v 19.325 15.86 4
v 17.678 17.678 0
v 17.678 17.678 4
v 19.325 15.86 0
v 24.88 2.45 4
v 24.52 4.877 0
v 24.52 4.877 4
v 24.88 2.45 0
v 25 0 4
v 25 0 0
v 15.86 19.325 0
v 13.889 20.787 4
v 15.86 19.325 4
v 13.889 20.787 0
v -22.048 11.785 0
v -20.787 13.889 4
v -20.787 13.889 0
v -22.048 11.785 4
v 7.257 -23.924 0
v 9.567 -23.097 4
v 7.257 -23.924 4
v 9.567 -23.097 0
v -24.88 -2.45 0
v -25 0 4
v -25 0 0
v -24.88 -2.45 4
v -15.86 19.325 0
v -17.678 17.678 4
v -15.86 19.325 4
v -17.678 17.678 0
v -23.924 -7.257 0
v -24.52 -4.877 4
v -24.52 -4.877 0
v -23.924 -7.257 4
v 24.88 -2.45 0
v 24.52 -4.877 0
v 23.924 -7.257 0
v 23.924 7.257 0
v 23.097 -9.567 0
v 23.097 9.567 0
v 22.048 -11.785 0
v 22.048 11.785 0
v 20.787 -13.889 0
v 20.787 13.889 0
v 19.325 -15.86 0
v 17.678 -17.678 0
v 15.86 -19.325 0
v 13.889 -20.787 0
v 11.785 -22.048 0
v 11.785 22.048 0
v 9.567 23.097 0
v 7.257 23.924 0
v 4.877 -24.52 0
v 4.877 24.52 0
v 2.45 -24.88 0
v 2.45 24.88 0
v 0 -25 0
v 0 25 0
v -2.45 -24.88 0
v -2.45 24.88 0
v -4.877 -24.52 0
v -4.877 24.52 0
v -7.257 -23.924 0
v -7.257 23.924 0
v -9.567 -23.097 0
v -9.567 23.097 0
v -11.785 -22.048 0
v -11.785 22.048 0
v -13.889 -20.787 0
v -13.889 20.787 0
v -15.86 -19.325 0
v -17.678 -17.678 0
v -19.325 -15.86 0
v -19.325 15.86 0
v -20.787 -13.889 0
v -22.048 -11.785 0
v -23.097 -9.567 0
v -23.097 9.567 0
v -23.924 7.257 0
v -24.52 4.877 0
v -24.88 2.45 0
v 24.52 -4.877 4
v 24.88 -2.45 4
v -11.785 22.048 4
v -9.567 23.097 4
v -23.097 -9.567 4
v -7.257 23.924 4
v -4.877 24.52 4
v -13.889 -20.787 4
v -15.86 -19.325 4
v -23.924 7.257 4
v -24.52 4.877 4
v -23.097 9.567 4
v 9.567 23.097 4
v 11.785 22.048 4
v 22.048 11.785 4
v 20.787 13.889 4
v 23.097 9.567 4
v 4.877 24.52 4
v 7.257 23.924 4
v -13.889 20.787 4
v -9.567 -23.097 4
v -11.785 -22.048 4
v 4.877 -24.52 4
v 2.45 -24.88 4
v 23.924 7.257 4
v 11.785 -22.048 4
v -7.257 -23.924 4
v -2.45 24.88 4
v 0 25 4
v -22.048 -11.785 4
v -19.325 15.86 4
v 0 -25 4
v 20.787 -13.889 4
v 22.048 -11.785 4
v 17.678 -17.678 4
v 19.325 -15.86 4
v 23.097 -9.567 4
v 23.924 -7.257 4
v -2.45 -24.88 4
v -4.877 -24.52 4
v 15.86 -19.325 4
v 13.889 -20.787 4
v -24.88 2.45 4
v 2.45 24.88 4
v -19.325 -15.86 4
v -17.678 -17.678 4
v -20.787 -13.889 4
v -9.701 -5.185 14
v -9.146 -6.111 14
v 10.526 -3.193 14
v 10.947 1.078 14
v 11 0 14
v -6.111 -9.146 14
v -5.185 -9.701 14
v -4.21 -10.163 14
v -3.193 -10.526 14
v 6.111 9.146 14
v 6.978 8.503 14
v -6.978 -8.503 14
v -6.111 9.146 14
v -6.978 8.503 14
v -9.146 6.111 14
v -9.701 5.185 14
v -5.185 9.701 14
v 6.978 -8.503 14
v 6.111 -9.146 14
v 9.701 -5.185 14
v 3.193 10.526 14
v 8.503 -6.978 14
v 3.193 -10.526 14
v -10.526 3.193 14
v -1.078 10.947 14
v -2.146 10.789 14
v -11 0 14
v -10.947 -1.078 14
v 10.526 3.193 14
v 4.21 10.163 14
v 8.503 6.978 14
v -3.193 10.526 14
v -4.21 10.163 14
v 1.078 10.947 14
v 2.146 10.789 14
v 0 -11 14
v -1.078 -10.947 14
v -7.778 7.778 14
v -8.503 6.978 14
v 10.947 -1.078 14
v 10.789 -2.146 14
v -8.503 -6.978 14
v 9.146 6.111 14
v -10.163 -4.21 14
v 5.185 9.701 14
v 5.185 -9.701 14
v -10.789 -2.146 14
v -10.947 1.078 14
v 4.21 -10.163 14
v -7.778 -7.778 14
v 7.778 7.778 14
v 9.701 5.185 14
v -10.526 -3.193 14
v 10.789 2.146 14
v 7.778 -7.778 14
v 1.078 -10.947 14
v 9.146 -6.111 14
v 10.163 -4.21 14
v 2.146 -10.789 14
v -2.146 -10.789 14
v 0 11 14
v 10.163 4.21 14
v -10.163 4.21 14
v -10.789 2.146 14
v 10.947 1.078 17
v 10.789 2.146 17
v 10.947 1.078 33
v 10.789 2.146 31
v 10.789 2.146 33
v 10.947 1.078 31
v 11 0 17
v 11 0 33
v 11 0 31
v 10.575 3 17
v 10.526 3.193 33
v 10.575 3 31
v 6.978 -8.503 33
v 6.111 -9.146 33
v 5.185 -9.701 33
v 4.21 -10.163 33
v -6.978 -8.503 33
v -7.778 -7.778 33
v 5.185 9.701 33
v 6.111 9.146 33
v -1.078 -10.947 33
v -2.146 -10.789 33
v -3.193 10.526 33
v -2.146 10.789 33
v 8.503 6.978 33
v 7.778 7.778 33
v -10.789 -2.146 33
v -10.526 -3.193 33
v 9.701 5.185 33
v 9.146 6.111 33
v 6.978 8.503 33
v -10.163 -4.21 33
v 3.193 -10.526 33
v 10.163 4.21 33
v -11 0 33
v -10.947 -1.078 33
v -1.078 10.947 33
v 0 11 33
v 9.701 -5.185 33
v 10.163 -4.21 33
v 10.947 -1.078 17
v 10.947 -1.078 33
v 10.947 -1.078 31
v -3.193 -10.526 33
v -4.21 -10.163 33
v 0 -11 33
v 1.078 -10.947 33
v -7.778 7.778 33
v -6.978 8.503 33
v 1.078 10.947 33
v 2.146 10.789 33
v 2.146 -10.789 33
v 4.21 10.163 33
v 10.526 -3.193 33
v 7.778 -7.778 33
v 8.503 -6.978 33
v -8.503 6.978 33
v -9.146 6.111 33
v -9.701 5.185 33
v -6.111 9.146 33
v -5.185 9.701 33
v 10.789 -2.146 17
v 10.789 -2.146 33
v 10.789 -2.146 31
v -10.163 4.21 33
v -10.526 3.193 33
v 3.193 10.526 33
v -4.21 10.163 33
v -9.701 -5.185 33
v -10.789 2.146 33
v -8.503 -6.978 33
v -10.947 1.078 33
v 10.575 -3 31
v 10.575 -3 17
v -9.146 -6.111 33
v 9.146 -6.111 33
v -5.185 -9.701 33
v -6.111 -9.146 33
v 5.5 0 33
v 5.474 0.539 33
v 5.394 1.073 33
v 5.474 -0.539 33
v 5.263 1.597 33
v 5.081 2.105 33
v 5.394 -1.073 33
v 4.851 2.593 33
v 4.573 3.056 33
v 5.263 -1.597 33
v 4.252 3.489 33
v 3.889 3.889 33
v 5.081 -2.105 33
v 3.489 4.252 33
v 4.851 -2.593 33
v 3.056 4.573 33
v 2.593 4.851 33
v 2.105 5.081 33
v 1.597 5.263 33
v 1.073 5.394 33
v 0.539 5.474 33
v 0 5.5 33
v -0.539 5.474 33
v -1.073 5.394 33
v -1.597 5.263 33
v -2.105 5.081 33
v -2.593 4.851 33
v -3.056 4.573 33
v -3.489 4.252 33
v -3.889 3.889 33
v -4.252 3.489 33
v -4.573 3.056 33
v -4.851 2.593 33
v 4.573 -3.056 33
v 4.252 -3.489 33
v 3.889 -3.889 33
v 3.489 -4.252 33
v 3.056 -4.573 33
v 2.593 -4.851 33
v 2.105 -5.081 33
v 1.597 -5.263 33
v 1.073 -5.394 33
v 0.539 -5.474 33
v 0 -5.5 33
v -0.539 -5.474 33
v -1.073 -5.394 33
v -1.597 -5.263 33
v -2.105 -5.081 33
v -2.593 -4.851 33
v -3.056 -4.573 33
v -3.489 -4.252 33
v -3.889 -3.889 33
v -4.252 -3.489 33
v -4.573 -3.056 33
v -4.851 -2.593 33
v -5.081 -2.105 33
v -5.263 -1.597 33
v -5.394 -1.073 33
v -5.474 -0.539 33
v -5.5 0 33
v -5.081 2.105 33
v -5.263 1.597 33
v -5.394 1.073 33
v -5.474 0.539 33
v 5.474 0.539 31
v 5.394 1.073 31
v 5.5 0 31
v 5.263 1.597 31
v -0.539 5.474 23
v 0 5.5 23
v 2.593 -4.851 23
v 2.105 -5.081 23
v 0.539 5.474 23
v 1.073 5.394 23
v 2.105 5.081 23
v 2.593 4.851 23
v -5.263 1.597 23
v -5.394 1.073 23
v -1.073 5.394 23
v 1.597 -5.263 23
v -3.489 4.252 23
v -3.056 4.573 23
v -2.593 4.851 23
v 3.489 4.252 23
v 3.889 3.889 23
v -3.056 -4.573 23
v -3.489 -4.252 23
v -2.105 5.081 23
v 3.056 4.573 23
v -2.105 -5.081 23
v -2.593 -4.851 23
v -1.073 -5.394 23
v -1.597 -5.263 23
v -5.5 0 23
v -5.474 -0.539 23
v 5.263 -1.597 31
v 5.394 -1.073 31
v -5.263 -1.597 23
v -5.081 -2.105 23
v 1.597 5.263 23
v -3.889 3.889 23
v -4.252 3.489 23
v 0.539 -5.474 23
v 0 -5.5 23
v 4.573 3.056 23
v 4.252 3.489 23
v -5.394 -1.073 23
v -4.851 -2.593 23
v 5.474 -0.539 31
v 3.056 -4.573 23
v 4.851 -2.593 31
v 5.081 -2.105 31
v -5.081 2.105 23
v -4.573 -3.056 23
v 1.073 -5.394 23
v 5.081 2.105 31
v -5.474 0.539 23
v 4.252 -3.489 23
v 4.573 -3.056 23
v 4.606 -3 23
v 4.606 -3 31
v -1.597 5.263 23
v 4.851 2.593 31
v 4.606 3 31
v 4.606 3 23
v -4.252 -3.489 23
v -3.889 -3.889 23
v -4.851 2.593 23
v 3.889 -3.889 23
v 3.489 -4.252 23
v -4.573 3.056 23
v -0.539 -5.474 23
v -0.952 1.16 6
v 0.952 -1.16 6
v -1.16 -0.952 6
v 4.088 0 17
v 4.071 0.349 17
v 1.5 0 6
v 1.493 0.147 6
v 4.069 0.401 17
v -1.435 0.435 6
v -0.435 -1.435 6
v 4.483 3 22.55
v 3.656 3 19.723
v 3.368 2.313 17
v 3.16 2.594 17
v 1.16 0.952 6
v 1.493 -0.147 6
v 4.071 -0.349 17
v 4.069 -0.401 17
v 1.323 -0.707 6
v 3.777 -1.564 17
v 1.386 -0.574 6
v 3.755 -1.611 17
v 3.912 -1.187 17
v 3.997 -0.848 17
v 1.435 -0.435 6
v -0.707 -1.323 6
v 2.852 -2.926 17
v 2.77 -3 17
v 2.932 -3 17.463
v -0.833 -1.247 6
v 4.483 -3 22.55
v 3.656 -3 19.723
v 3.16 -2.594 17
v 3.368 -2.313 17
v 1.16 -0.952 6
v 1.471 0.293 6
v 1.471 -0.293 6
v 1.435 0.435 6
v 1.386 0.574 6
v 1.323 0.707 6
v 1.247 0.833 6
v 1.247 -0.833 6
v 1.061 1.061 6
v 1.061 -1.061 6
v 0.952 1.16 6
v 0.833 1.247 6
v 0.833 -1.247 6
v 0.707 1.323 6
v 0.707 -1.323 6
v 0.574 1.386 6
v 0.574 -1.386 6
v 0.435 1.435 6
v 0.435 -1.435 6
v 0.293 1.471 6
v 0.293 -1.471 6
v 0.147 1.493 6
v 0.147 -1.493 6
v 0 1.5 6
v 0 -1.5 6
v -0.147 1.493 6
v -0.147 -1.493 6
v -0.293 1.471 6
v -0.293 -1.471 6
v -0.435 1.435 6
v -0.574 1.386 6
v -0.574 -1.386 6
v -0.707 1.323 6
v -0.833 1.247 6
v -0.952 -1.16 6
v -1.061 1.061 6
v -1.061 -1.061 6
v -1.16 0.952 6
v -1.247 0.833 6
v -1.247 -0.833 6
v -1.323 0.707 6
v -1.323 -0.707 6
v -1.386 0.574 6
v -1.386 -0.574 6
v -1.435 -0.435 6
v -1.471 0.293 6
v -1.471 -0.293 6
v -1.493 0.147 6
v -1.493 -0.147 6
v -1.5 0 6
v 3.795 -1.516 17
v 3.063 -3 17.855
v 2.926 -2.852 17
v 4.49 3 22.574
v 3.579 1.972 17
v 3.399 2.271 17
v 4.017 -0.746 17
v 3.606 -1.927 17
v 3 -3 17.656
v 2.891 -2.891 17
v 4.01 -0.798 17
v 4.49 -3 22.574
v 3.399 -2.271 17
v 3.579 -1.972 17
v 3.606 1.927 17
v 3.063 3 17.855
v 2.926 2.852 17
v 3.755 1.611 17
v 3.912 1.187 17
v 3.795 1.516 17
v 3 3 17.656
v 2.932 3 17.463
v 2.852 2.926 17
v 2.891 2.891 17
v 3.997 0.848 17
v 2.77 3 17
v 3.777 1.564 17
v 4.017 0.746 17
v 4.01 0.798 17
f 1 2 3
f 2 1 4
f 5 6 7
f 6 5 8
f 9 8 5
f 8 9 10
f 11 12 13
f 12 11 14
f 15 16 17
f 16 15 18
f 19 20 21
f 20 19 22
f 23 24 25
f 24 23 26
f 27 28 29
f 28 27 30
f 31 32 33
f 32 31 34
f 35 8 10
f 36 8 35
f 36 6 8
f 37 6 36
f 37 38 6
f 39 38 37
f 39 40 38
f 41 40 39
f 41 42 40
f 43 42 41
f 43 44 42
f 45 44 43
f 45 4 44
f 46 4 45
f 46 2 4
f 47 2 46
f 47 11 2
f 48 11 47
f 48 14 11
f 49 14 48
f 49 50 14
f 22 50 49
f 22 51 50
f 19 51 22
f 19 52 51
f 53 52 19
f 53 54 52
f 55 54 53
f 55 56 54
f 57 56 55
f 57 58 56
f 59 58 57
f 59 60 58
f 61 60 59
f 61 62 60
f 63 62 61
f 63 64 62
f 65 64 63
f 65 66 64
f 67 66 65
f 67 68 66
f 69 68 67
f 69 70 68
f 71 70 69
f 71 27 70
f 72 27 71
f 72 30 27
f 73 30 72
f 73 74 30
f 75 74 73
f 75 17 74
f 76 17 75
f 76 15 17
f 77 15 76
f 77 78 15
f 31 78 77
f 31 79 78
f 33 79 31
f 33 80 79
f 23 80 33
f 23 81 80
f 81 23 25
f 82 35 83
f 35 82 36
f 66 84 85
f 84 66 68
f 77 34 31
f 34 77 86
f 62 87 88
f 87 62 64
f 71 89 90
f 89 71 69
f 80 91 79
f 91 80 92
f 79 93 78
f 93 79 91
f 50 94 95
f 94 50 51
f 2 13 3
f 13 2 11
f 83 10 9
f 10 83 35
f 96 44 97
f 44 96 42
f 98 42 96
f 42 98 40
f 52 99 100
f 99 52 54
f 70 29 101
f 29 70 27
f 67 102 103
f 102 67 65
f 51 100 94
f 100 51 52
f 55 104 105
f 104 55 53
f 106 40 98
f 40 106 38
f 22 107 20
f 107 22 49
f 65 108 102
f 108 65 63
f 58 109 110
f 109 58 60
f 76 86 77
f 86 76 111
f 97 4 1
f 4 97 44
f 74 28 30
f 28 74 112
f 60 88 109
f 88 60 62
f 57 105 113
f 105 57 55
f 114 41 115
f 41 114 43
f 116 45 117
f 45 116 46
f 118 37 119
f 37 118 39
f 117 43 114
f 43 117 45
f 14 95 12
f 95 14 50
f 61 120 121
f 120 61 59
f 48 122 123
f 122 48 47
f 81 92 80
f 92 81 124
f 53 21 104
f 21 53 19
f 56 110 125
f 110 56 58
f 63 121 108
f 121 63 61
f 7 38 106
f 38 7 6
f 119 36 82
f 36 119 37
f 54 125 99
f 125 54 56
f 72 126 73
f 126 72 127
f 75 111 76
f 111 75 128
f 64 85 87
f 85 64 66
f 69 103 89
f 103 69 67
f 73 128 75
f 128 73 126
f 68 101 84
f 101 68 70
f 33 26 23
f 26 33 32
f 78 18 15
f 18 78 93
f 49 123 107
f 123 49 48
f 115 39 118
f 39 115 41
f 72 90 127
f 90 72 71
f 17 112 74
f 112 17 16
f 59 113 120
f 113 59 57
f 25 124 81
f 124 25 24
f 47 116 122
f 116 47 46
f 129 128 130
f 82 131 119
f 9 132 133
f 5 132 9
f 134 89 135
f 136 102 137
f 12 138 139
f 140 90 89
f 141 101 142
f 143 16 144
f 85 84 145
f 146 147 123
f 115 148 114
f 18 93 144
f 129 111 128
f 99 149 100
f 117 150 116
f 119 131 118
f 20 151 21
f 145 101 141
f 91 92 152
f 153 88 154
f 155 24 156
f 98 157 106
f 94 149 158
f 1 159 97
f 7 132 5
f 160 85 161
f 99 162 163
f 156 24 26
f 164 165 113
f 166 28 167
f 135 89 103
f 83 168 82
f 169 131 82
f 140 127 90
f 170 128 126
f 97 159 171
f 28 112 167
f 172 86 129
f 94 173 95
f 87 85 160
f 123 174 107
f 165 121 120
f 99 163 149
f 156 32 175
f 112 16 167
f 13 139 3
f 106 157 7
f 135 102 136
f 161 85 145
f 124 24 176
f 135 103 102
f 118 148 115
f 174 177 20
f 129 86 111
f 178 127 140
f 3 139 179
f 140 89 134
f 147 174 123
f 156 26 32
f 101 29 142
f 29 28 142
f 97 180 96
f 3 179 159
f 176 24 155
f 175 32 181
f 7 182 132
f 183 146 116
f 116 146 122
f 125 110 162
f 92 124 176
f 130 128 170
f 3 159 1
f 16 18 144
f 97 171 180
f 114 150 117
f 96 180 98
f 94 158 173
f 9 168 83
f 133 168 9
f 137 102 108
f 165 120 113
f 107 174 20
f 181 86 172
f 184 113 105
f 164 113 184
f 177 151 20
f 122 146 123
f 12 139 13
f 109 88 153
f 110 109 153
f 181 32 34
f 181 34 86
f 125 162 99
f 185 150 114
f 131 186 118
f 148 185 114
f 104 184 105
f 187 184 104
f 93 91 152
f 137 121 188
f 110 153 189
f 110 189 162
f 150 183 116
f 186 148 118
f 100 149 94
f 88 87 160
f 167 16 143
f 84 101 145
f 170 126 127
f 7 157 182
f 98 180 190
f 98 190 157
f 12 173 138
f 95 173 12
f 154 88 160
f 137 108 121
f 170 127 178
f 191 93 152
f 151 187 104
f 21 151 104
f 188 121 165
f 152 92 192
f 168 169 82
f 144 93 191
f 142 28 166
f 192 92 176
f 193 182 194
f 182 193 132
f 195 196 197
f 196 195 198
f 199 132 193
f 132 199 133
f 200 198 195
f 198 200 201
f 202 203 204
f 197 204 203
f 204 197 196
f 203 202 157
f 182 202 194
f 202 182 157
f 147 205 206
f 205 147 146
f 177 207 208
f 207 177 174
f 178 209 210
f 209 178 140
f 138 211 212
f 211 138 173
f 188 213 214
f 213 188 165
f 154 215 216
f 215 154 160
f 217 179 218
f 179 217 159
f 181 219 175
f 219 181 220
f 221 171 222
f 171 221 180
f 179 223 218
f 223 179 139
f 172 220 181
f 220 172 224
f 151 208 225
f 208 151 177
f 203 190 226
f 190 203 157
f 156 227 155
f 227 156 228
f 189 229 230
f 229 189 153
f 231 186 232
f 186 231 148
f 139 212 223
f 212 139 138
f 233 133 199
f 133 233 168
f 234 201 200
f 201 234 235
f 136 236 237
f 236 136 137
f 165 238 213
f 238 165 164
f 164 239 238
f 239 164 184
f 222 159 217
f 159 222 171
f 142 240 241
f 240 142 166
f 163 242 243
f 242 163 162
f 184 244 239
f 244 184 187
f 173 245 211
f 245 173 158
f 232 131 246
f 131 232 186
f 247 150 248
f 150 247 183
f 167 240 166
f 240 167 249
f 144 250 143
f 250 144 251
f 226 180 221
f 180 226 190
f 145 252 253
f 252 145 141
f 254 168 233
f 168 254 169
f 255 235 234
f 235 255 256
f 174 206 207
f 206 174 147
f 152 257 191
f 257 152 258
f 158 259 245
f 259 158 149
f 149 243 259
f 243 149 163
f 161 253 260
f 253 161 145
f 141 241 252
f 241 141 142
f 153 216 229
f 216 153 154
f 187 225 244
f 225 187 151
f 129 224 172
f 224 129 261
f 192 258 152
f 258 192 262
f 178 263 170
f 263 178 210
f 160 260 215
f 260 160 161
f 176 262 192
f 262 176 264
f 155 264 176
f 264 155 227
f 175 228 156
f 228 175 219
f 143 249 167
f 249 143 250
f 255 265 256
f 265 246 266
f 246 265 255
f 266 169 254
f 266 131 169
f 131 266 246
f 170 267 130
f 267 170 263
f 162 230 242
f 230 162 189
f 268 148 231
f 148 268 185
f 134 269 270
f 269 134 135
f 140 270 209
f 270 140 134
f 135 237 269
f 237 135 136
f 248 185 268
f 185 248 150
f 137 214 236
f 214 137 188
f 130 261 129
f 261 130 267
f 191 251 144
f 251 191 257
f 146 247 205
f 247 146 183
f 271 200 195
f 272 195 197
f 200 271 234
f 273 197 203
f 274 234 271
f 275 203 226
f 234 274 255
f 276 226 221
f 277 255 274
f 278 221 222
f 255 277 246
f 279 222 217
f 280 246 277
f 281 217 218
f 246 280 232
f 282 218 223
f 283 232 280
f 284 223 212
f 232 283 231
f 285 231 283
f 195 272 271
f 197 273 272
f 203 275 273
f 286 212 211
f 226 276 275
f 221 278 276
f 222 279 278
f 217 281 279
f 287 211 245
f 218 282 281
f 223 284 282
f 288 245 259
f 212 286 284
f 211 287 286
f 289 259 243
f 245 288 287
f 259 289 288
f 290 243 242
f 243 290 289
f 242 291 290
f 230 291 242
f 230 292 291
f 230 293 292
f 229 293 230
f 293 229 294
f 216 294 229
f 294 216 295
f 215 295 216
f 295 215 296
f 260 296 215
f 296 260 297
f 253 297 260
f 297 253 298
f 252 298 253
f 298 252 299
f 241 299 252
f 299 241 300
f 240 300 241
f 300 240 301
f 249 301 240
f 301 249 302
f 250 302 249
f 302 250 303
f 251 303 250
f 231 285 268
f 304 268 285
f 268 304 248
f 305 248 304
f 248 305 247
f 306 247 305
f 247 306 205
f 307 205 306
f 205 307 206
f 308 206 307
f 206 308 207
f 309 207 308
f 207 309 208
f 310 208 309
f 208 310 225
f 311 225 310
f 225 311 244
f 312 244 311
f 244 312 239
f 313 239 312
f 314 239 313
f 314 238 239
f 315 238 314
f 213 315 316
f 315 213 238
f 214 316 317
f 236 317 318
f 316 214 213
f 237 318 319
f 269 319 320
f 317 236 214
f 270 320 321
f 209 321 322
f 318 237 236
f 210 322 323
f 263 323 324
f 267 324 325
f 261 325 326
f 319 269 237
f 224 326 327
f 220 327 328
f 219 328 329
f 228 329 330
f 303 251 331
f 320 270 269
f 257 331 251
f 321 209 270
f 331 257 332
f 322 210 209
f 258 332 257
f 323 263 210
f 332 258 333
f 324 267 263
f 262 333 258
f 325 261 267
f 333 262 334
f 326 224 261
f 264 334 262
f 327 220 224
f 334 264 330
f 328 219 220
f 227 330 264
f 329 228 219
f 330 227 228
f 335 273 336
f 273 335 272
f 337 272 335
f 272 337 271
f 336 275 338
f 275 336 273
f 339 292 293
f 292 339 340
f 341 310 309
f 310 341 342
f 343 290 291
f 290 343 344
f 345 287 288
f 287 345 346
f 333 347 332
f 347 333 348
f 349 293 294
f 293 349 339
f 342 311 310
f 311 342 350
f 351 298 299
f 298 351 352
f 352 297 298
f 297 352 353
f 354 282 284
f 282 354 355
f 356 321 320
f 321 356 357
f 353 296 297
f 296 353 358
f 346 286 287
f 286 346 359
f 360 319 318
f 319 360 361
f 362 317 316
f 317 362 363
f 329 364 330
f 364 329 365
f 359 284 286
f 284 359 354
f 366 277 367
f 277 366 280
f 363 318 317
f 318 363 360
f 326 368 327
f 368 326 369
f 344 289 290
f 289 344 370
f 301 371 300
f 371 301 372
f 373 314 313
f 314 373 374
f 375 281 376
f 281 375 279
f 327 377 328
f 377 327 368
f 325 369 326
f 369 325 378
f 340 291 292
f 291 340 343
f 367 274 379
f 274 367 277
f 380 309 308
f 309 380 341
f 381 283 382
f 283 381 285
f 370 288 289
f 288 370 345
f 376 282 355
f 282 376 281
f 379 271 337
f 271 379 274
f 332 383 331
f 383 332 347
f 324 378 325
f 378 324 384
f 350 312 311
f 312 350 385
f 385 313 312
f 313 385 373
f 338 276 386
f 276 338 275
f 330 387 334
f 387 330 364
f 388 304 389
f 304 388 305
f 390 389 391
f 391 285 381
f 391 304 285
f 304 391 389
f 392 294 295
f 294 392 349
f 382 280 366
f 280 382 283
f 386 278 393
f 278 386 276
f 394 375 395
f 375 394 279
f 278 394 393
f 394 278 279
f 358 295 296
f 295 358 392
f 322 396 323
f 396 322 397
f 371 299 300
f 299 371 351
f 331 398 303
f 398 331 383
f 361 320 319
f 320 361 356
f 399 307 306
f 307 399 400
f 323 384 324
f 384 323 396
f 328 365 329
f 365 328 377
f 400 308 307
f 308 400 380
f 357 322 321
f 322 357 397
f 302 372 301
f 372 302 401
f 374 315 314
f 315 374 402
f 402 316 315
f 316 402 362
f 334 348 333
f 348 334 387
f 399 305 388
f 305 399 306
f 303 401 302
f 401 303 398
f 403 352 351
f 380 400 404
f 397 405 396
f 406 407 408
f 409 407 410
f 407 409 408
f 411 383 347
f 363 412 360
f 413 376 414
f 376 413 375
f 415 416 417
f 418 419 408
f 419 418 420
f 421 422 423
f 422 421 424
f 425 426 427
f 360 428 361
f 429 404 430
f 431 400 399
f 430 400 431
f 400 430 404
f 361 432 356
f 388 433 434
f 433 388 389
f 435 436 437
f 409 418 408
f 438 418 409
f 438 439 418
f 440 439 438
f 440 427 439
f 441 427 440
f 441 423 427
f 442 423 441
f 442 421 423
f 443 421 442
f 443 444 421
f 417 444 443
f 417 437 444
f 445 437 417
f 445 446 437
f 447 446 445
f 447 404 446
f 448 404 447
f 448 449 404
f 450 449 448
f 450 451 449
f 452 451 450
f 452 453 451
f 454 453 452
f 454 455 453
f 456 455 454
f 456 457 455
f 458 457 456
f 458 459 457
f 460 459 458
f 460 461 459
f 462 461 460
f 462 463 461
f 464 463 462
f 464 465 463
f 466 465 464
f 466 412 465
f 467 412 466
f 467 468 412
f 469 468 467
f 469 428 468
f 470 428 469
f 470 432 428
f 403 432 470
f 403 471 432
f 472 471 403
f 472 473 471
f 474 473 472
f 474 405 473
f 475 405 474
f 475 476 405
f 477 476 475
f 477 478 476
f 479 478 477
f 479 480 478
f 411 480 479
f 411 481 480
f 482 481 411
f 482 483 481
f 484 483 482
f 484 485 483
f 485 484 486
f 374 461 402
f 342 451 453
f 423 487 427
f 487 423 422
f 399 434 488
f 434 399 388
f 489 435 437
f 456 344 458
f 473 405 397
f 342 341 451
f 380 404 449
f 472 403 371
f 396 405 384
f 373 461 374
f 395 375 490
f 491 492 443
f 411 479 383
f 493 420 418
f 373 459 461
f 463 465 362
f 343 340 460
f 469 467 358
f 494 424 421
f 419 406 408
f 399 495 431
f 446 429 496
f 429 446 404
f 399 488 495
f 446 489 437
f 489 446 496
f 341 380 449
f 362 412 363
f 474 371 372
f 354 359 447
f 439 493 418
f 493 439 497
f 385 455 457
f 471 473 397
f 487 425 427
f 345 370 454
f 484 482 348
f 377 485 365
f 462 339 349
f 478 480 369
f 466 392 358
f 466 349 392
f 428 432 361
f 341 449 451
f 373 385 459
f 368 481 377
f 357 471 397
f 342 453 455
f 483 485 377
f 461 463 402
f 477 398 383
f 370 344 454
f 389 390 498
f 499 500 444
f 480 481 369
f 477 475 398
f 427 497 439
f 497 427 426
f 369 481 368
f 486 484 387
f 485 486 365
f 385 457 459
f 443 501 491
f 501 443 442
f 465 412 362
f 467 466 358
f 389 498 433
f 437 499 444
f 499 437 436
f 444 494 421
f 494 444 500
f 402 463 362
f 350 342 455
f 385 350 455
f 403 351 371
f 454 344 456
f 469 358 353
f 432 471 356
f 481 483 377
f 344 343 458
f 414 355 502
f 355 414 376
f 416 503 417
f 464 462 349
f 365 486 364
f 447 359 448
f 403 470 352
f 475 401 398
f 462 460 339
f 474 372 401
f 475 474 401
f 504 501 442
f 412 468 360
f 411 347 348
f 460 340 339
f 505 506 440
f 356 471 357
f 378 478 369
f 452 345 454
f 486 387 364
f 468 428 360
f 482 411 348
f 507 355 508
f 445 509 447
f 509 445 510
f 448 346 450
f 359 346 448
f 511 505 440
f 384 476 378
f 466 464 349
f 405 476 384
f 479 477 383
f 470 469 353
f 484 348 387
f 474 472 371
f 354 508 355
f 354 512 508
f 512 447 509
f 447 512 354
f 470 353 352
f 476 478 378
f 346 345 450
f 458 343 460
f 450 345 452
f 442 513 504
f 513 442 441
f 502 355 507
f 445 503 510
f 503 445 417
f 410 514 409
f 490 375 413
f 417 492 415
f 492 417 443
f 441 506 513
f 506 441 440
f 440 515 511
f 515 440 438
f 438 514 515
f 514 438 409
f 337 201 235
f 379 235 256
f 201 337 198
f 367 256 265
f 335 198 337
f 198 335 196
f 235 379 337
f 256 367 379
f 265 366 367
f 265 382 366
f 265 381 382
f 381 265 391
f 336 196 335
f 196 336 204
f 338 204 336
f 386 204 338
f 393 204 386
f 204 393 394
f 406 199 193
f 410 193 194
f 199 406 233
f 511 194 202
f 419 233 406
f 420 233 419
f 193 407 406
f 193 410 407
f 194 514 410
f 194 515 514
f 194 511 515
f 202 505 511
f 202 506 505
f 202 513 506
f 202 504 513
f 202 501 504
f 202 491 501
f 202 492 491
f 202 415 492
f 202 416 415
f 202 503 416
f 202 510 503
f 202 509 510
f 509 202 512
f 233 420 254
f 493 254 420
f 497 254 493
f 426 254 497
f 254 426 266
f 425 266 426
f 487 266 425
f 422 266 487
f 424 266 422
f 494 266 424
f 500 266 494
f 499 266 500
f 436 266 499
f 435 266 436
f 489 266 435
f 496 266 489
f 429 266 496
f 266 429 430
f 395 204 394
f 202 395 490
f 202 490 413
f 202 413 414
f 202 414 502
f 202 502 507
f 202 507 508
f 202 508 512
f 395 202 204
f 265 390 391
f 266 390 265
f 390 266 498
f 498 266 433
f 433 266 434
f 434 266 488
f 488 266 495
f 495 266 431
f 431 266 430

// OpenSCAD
// Dimensions (mm)
base_diameter = 50;
base_height = 4;

cone_bottom_diameter = 50;  // at z=4
cone_top_diameter = 22;     // at z=14
cone_height = 10;           // from z=4 to z=14

column_diameter = 22;
column_height = 19;         // from z=14 to z=33

seat_diameter_top = 11;     // from z=33 down to z=23
seat_top_z = 33;
seat_cone_start_z = 23;

cone_tip_diameter = 3;
cone_tip_z = 6;

viewing_window_width = 4;   // in Y direction
window_z_min = 18;
window_z_max = 30;

$fn = 64;

// Build the final part
difference() {
    // Main shape: base + cone + column
    union() {
        // Base disc
        cylinder(d = base_diameter, h = base_height);
        
        // Cone from z=4 to z=14
        translate([0, 0, base_height])
            cylinder(d1 = cone_bottom_diameter, d2 = cone_top_diameter, h = cone_height);
        
        // Column from z=14 to z=33
        translate([0, 0, base_height + cone_height])
            cylinder(d = column_diameter, h = column_height);
    }
    
    // Subtract: cylindrical part of the seat from z=23 to z=33 (diameter 11 mm)
    translate([0, 0, seat_cone_start_z])
        cylinder(d = seat_diameter_top, h = seat_top_z - seat_cone_start_z);
    
    // Subtract: cone from z=6 to z=23, narrowing from 3 mm to 11 mm
    translate([0, 0, cone_tip_z])
        cylinder(d1 = cone_tip_diameter, d2 = seat_diameter_top, h = seat_cone_start_z - cone_tip_z);
    
    // Subtract: viewing window (4 mm wide in Y, on +X side, from z=18 to z=30)
    translate([0, -viewing_window_width/2 - 1, window_z_min - 1])
        cube([13, viewing_window_width + 2, window_z_max - window_z_min + 2]);
}
